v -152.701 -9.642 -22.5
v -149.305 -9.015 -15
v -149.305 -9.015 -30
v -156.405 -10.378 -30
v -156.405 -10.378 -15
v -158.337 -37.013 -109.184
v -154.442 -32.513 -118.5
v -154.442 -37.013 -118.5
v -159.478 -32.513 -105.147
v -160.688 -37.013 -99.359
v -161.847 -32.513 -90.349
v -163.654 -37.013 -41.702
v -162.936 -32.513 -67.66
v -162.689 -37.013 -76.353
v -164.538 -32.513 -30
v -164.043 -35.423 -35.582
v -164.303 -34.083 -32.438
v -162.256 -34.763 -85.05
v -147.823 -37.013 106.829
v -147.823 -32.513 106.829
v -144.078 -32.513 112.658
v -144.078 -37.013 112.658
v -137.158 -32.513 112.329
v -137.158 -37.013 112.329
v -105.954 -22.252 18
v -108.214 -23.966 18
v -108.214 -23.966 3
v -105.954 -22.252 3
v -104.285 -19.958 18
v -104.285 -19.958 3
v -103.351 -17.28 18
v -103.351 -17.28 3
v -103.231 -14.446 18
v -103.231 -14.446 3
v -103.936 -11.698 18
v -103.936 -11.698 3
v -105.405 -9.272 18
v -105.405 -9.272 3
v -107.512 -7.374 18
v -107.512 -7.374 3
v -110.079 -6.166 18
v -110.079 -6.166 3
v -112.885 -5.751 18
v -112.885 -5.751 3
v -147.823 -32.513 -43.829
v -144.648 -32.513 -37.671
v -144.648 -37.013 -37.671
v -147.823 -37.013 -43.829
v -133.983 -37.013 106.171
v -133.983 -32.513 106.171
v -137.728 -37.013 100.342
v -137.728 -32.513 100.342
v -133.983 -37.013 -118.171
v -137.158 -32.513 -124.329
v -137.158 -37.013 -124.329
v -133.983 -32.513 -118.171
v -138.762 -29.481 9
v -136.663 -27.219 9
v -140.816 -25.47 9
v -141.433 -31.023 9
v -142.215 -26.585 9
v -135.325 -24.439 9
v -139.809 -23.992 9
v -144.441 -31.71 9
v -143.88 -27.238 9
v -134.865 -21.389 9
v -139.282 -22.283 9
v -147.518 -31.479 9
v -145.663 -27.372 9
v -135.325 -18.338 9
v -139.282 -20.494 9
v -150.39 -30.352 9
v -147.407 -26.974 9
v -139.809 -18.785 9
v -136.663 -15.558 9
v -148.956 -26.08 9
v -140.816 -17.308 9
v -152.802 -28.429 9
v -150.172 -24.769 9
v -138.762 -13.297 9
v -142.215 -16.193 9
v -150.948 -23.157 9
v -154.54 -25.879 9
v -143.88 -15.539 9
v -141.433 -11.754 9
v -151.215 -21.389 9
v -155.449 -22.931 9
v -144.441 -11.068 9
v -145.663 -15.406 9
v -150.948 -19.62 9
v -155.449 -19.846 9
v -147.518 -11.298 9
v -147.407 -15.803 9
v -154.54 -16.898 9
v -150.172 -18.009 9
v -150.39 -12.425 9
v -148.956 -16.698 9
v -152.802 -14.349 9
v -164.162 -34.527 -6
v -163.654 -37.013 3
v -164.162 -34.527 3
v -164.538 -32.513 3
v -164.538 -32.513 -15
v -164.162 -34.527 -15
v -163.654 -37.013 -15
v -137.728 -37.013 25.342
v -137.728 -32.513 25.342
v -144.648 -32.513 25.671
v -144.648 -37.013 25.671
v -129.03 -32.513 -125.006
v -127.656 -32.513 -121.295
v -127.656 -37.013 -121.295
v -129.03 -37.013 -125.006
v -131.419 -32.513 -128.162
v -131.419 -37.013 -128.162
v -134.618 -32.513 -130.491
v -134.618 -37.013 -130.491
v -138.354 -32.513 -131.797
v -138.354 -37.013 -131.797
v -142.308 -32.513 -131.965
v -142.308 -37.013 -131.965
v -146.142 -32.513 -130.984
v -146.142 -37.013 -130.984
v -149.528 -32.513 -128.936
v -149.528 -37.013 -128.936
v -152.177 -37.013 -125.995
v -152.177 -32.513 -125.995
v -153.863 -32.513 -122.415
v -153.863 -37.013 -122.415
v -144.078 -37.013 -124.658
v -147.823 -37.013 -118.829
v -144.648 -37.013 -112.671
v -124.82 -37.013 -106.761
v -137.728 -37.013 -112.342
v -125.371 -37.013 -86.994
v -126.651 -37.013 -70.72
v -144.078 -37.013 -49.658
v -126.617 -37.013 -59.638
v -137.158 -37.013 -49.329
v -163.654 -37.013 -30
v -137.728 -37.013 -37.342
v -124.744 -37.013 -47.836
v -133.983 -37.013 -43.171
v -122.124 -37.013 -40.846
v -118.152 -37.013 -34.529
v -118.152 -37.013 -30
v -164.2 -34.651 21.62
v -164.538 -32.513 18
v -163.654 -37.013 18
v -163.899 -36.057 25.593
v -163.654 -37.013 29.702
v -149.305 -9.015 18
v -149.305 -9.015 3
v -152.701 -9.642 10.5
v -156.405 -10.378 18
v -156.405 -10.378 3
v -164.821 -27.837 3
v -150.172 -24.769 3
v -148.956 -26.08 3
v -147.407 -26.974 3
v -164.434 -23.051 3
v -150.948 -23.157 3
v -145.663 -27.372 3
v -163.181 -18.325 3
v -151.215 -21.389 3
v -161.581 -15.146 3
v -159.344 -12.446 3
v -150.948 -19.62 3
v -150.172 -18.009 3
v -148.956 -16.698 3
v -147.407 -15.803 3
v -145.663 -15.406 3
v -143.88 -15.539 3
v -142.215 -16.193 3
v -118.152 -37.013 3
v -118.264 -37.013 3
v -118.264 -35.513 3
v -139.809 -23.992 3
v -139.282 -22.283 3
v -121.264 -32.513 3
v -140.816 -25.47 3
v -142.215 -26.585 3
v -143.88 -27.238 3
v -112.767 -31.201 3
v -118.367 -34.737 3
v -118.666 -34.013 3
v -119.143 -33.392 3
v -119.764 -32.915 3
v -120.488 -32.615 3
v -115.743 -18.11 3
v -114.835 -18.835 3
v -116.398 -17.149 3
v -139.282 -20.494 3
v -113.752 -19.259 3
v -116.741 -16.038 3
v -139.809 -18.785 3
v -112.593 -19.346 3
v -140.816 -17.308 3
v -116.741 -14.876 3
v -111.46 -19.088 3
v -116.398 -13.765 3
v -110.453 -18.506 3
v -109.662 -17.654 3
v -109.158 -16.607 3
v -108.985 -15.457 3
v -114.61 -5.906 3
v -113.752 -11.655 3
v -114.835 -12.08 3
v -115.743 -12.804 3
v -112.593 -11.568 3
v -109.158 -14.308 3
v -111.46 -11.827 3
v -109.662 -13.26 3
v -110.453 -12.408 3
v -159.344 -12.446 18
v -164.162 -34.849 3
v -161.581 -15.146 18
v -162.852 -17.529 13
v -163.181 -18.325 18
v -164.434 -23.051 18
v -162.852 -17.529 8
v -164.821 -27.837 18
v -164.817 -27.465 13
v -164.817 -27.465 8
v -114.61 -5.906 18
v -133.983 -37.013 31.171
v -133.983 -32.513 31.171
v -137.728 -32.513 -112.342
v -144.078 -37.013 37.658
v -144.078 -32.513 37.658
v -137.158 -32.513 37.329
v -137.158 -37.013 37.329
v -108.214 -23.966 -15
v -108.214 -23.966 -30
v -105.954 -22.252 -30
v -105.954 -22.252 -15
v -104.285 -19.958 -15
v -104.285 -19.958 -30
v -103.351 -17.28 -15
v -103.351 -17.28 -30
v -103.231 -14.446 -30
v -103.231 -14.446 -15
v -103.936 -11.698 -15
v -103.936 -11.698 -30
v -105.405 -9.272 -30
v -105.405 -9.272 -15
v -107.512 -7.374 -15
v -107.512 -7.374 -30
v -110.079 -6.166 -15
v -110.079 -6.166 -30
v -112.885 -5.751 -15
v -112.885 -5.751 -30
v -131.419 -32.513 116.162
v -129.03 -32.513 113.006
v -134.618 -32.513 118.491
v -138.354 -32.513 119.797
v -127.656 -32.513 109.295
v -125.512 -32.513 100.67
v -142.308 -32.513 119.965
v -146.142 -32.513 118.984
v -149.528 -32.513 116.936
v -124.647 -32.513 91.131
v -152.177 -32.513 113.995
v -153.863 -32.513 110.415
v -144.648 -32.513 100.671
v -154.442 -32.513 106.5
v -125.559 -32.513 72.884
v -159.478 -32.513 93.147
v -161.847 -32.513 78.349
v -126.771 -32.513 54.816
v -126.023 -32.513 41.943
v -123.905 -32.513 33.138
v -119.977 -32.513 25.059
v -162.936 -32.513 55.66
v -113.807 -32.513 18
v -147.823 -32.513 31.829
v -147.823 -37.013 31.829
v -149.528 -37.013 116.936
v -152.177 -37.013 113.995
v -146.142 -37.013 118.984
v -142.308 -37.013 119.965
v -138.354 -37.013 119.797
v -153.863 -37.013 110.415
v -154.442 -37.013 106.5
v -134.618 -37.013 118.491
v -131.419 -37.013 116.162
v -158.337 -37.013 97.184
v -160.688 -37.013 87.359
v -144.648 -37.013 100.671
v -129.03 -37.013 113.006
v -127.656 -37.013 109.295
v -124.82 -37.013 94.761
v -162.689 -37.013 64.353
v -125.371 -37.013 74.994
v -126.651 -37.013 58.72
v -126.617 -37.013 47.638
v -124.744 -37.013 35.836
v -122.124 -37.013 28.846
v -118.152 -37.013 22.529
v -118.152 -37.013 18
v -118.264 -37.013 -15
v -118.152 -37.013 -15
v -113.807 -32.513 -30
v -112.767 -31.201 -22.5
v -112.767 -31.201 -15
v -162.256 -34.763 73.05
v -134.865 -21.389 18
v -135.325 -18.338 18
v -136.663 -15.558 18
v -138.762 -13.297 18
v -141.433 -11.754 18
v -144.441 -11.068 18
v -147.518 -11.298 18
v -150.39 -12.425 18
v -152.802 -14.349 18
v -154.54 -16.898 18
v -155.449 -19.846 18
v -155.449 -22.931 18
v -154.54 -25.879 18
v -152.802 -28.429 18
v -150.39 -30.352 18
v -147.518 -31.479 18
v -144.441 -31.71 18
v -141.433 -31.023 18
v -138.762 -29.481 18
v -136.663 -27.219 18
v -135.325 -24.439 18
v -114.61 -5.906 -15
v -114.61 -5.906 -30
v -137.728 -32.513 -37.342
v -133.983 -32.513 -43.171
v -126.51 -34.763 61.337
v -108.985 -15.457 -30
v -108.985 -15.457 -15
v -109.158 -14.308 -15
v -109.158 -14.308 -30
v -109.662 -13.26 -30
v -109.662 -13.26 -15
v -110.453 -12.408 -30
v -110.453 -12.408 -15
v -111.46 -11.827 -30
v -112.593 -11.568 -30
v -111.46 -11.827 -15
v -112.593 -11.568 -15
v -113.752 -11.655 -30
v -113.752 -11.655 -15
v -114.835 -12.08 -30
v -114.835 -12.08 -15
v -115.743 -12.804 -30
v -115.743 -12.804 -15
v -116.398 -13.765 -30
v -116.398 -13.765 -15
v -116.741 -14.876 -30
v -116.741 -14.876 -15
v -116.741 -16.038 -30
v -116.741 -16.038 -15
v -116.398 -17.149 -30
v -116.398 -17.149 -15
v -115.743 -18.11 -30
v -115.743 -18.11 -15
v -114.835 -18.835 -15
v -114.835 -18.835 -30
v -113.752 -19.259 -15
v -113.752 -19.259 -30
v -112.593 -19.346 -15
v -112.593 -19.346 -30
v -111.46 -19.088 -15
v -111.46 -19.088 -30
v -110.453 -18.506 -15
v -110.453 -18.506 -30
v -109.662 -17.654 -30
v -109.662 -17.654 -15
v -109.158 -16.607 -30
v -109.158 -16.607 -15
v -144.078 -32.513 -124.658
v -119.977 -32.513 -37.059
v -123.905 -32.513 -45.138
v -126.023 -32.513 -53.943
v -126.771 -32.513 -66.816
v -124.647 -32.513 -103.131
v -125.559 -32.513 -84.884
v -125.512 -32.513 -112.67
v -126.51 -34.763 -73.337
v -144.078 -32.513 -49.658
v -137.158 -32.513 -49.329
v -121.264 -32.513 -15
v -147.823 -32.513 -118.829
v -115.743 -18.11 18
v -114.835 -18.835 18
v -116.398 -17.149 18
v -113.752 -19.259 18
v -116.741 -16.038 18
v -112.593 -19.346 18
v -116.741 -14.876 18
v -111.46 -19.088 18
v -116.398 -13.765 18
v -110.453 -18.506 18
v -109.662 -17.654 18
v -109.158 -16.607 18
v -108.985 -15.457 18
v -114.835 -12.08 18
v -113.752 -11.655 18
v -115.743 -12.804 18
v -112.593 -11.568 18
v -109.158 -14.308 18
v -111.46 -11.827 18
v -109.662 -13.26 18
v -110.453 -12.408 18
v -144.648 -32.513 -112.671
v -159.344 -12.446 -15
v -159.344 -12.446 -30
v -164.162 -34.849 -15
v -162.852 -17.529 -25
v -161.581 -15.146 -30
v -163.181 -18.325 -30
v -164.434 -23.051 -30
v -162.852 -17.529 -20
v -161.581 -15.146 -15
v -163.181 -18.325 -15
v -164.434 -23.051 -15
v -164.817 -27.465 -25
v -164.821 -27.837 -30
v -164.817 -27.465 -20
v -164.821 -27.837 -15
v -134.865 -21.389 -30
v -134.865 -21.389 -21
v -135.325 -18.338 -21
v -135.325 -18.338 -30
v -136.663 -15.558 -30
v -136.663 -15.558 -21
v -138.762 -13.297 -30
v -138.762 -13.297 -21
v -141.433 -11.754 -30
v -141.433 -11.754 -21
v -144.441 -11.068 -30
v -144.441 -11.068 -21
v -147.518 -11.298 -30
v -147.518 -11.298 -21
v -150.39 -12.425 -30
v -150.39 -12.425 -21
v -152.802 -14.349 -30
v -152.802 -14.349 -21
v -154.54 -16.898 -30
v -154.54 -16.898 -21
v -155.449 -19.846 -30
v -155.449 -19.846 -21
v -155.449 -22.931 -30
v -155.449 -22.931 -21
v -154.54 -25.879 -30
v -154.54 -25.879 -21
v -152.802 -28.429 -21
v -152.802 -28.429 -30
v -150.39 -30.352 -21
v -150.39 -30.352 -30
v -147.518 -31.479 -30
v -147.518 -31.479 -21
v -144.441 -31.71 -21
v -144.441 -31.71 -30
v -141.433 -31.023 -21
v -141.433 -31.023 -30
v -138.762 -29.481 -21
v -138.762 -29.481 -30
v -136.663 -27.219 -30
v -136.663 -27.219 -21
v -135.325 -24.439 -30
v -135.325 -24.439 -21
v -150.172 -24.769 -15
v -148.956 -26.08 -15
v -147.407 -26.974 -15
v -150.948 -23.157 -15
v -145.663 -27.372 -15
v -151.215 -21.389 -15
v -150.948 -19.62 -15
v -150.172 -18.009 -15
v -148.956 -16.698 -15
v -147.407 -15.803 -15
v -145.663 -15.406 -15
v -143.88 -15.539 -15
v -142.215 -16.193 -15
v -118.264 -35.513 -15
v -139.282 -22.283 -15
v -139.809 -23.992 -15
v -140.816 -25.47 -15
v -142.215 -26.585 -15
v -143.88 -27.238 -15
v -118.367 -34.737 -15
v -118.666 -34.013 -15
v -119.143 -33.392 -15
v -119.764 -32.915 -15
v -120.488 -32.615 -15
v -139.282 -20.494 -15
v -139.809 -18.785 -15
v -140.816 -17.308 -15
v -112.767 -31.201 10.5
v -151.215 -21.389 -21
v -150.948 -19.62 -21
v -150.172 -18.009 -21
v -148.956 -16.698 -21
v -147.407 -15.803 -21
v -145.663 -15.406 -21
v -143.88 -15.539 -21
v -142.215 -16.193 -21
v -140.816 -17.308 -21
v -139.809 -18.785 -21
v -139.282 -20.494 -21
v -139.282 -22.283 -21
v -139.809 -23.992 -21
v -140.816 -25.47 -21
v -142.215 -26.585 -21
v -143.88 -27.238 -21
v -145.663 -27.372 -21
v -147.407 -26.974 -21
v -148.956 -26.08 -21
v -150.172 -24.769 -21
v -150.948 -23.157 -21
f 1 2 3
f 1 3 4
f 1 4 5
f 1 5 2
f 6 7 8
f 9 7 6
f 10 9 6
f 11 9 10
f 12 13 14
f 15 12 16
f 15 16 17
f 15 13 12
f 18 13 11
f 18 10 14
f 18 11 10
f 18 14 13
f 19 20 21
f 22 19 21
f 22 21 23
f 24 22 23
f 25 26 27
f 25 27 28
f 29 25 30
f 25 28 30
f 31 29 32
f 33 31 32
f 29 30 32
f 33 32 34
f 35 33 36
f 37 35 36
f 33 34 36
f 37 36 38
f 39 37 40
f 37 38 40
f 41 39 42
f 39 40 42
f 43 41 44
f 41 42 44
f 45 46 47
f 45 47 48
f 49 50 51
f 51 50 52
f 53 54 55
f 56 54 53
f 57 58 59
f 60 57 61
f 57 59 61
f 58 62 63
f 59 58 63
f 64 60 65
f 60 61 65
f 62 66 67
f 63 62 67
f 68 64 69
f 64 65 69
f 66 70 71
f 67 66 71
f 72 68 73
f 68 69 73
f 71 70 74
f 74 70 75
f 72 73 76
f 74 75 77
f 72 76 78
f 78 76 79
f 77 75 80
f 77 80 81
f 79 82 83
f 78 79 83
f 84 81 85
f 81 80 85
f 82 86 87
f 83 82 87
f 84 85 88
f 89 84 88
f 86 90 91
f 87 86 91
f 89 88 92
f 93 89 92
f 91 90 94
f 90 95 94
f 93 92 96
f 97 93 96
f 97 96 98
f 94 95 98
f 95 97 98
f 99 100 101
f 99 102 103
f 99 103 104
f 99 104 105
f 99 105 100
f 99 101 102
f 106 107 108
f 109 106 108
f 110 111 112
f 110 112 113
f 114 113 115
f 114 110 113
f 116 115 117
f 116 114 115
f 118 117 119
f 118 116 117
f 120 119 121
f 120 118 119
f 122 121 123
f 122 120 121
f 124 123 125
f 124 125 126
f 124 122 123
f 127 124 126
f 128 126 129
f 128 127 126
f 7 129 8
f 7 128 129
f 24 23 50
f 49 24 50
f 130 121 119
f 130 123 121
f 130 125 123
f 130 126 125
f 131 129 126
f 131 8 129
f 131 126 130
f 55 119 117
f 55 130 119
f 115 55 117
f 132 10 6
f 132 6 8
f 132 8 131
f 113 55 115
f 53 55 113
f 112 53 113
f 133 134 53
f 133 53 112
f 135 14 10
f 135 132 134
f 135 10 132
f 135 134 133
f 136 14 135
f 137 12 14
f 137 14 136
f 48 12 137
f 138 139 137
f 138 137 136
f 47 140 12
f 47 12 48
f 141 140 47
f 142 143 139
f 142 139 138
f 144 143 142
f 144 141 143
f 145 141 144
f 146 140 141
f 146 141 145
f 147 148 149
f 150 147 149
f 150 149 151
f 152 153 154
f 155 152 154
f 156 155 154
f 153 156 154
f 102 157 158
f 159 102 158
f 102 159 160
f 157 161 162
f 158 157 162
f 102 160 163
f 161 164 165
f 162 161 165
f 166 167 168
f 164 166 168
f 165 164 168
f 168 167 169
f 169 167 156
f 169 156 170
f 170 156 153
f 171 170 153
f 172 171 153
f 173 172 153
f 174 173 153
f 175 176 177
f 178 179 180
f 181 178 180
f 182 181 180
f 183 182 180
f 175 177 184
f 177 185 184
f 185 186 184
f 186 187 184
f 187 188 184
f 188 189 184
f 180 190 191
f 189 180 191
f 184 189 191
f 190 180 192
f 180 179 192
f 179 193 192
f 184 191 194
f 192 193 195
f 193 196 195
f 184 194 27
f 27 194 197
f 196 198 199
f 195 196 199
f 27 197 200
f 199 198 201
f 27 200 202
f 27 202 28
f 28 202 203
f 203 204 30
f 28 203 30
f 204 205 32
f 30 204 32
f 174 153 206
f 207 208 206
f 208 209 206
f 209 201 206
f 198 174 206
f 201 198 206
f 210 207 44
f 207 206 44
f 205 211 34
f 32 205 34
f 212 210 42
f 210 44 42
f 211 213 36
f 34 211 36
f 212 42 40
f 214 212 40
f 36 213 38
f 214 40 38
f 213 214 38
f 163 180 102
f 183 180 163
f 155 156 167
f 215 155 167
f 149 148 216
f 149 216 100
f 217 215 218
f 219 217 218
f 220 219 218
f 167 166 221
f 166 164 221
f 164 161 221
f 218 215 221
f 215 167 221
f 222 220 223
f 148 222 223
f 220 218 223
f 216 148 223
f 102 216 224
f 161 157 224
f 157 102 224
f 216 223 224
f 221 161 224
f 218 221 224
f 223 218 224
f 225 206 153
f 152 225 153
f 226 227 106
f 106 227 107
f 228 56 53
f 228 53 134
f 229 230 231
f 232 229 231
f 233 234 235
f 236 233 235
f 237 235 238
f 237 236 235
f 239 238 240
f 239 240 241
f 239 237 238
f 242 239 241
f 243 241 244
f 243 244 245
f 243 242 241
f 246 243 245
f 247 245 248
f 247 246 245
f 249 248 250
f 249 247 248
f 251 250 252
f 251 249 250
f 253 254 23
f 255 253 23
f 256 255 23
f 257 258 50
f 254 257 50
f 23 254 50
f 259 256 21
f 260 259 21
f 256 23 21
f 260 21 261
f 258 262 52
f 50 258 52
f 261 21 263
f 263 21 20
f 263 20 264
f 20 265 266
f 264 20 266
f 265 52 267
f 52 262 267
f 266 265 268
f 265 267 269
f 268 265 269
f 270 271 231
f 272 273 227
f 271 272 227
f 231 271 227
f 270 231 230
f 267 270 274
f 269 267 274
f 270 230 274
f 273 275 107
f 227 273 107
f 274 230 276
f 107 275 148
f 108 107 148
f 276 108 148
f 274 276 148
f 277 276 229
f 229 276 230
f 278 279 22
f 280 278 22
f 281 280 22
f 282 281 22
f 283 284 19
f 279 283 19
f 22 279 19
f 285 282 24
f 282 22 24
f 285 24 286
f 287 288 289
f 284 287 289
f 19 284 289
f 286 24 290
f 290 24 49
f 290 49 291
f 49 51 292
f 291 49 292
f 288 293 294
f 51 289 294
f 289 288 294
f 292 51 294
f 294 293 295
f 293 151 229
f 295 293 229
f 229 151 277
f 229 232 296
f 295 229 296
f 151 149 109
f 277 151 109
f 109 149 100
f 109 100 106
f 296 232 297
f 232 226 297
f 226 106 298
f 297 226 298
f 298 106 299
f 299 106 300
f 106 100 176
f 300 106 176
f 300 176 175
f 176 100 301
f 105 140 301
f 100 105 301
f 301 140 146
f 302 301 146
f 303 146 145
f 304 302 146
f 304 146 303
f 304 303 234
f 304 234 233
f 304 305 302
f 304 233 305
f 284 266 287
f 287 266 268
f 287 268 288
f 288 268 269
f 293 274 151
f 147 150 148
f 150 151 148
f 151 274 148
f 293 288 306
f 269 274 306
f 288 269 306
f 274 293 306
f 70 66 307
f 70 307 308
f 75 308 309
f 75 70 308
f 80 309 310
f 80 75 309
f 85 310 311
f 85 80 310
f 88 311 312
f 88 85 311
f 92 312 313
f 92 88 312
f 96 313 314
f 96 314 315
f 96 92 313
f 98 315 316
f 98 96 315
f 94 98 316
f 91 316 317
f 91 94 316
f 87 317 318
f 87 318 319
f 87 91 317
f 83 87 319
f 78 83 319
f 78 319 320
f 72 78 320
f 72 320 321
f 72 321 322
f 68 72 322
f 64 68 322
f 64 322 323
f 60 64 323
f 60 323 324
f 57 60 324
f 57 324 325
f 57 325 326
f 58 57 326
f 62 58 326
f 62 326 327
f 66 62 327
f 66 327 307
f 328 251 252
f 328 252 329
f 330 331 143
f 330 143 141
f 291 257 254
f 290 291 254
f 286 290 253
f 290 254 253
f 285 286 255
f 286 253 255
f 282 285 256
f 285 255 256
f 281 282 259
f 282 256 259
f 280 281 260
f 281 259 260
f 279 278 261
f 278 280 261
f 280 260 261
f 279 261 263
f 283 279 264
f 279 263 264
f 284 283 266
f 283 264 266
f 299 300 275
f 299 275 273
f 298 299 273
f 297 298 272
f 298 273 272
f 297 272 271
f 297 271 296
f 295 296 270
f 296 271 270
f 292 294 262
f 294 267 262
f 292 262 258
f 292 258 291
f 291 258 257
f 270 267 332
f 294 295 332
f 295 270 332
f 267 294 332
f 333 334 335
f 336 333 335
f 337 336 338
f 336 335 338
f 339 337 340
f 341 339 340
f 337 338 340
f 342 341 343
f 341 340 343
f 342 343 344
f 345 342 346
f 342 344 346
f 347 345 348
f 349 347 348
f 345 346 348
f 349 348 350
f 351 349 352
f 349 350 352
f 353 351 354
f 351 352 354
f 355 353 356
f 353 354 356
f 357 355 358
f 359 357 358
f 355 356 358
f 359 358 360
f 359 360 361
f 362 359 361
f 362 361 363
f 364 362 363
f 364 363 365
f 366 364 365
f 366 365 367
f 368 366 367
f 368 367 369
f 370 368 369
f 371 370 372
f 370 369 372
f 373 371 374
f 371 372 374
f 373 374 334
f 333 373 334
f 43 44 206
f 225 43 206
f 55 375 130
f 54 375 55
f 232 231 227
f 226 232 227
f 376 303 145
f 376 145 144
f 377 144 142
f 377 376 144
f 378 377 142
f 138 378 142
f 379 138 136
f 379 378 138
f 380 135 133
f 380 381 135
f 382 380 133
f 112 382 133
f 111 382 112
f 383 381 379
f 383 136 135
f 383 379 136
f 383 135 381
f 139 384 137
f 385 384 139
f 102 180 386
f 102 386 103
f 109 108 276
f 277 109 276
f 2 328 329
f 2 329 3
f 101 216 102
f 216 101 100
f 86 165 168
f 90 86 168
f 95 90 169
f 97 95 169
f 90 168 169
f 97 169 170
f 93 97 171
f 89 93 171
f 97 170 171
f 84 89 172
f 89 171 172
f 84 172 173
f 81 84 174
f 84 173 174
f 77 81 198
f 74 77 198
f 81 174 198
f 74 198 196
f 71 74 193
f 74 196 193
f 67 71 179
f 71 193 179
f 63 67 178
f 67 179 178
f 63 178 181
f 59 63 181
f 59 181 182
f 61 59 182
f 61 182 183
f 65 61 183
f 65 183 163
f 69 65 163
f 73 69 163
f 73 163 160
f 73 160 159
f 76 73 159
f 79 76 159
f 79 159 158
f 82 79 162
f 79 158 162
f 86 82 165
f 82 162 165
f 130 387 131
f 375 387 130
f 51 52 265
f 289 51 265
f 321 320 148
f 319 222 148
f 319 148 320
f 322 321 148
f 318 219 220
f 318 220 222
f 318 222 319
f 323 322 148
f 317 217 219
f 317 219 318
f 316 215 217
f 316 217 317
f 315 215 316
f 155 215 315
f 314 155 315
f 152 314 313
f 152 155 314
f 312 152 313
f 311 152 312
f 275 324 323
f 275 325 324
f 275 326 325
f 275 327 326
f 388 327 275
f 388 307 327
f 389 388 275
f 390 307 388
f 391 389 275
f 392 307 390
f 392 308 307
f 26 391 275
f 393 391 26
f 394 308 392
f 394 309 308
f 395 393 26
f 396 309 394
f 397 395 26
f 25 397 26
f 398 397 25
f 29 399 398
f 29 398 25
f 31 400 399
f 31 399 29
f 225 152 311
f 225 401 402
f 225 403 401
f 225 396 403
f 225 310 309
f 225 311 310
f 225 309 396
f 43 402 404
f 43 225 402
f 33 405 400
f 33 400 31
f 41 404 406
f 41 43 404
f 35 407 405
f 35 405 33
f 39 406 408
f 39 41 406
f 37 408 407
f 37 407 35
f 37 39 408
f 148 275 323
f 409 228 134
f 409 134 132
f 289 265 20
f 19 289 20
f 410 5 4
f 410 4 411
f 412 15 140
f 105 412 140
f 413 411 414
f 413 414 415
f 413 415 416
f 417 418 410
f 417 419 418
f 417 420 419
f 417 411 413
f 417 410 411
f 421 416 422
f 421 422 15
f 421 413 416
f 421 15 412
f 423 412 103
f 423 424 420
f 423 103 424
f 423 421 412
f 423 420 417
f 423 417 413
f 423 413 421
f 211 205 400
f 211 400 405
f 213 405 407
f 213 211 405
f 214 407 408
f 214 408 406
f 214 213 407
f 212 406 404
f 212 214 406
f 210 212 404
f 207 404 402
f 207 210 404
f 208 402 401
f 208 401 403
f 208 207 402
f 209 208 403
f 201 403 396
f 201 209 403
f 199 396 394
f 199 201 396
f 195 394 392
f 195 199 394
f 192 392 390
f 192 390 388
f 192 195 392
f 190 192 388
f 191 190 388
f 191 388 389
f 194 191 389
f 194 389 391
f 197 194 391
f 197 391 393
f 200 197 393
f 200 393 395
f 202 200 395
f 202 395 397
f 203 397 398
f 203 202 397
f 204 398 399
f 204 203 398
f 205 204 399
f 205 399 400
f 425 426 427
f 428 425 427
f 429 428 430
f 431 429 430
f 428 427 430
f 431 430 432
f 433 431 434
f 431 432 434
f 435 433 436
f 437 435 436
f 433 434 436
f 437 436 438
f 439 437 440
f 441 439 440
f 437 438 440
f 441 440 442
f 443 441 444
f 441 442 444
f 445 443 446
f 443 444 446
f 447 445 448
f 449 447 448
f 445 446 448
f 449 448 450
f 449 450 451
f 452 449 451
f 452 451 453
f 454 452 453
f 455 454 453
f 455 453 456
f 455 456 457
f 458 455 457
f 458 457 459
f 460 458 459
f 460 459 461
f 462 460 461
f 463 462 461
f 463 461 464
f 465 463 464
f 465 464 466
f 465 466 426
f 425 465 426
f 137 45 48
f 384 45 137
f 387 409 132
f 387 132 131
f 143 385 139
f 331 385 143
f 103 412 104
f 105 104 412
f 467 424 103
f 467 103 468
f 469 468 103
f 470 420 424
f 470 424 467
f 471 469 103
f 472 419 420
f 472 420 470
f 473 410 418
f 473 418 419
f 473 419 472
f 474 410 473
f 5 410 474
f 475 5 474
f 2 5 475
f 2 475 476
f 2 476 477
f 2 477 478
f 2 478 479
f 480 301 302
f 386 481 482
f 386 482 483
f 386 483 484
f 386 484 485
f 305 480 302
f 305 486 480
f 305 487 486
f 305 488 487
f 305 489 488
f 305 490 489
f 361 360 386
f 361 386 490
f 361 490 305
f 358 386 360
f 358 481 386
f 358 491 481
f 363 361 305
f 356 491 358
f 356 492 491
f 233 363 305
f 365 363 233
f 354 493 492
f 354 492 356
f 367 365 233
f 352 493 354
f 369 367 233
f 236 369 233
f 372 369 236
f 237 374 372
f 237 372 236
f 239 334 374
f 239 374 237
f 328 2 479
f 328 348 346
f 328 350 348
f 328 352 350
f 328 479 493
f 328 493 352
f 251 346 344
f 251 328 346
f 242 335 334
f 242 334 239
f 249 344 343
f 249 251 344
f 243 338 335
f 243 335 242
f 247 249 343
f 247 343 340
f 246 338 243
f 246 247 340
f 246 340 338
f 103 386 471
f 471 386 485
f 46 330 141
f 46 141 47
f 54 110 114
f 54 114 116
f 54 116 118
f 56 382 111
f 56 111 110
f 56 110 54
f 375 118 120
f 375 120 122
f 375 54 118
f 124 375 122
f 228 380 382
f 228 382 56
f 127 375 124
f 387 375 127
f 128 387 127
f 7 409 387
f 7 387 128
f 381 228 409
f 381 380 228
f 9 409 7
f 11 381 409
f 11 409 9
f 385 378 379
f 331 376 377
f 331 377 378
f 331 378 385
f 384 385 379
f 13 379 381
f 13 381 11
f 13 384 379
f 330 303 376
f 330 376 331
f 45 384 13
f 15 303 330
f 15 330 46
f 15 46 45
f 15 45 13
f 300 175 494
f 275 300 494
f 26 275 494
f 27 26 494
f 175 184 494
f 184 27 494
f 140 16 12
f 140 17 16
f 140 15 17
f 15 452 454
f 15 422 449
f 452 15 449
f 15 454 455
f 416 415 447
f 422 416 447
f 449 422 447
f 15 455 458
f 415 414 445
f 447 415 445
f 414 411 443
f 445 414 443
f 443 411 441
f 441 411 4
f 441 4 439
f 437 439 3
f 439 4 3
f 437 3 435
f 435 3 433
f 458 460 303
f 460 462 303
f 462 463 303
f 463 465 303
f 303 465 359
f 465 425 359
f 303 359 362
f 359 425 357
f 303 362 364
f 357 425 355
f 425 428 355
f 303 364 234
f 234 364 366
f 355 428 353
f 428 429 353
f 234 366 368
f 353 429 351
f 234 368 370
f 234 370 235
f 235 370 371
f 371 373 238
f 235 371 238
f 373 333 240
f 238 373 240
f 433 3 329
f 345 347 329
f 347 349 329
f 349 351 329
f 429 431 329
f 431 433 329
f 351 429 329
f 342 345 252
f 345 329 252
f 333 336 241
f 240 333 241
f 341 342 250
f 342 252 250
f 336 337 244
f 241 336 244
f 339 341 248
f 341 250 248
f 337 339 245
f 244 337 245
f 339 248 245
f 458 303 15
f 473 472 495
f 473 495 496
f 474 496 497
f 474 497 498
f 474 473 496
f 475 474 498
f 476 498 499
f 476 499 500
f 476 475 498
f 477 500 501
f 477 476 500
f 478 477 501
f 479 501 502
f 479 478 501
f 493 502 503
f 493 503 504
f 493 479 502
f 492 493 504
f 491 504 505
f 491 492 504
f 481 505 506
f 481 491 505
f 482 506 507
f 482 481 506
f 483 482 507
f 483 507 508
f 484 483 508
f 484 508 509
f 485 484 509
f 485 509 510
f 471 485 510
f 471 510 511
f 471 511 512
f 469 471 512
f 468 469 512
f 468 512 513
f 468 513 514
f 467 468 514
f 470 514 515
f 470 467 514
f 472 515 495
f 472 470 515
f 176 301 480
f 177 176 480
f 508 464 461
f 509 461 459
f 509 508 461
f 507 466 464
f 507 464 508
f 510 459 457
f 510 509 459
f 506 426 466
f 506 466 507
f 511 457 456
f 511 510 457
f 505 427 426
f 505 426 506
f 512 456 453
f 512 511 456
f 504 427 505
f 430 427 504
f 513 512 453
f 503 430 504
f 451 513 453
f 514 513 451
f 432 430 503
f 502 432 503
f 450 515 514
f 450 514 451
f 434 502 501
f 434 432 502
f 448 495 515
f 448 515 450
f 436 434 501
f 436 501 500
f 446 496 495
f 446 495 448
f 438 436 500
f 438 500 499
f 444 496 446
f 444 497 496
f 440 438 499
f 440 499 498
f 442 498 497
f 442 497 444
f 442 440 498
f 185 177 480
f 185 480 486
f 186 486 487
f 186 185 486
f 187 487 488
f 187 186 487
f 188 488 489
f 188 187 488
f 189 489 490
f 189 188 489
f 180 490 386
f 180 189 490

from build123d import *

# Parameters (mm, degrees)
SKETCH1_R           = 6.9
SKETCH1_R_2         = 2.6
BOSS_EXTRUDE1_DEPTH = 10
BOSS_EXTRUDE2_DEPTH = 12
SKETCH3_R           = 7
SKETCH3_R_2         = 4
BOSS_EXTRUDE3_DEPTH = 4
BOSS_EXTRUDE4_DEPTH = 84
BOSS_EXTRUDE5_DEPTH = 84
CUT_EXTRUDE1_DEPTH  = 190.323263107
SCALE1_SCALE        = 1.5


with BuildPart() as part:
    # Sketch1 → Boss-Extrude1 (new body)
    with BuildSketch(Plane.XY):
        with BuildLine():
            Line((-155.070766667, -34.03543395), (-139.182010536, -34.03543395))
            Line((-139.182010536, -34.03543395), (-124.735717634, -34.03543395))
            add(Edge.make_bspline(
                [(-124.735717634, -34.03543395), (-120.868070652, -30.634901056), (-118.110731489, -25.337058748)],
                knots=[0.604913823, 0.604913823, 0.604913823, 1, 1, 1], degree=2))
            ThreePointArc((-118.110731489, -25.337058748), (-114.956411592, -18.057608365), (-121.224300514, -13.194101363))
            Line((-121.224300514, -13.194101363), (-122.374915538, -13.297224598))
            Line((-122.374915538, -13.297224598), (-145.504342678, -15.370186717))
            add(Edge.make_bspline(
                [(-145.504342678, -15.370186717), (-147.665446471, -15.751951197), (-150.237941893, -16.278752791)],
                knots=[0, 0, 0, 0.143499102, 0.143499102, 0.143499102], degree=2))
            add(Edge.make_bspline(
                [(-150.237941893, -16.278752791), (-156.331446907, -19.412430802), (-156.587305002, -28.504886835), (-155.070766667, -34.03543395)],
                knots=[0, 0, 0, 0, 1, 1, 1, 1], degree=3))
        make_face()
        with Locations((-142.777717077, -23.619181221)):
            Circle(SKETCH1_R, mode=Mode.SUBTRACT)
        with Locations((-121.224300514, -19.664754316)):
            Circle(SKETCH1_R_2, mode=Mode.SUBTRACT)
    boss_extrude1 = extrude(amount=BOSS_EXTRUDE1_DEPTH)

    # Sketch2 → Boss-Extrude2 (add)
    with BuildSketch(Plane(origin=(0, 0, 0), x_dir=(-1, 0, 0), z_dir=(0, 0, -1))):
        with BuildLine():
            Line((124.810828249, -34.03543395), (124.810828249, -33.03543395))
            ThreePointArc((124.810828249, -33.03543395), (125.396614687, -31.621220388), (126.810828249, -31.03543395))
            Line((126.810828249, -31.03543395), (155.660238601, -31.03543395))
            add(Edge.make_bspline(
                [(155.660238601, -31.03543395), (155.453340821, -32.220849379), (155.070766667, -34.03543395)],
                knots=[0.469279702, 0.469279702, 0.469279702, 1.113861257, 1.113861257, 1.113861257], degree=2))
            Line((155.070766667, -34.03543395), (124.810828249, -34.03543395))
        make_face()
    extrude(amount=BOSS_EXTRUDE2_DEPTH)

    # Mirror1: Boss-Extrude1 across plane
    add(boss_extrude1.mirror(Plane(origin=(0, 0, -6), x_dir=(1, 0, 0), z_dir=(0, 0, -1))))

    # Sketch3 → Boss-Extrude3 (add)
    with BuildSketch(Plane(origin=(0, 0, 0), x_dir=(-1, 0, 0), z_dir=(0, 0, -1))):
        with Locations((142.777717077, -23.619181221)):
            Circle(SKETCH3_R)
        with Locations((142.777717077, -23.619181221)):
            Circle(SKETCH3_R_2, mode=Mode.SUBTRACT)
    boss_extrude3 = extrude(amount=-BOSS_EXTRUDE3_DEPTH)

    # Mirror2: Boss-Extrude3 across plane
    add(boss_extrude3.mirror(Plane(origin=(0, 0, -6), x_dir=(1, 0, 0), z_dir=(0, 0, -1))))

    # Sketch4 → Boss-Extrude4 (add)
    with BuildSketch(Plane.XY.offset(10)):
        with BuildLine():
            add(Edge.make_bspline(
                [(-155.660238601, -31.03543395), (-155.52477055, -32.104378324), (-155.322110933, -33.11882586), (-155.070766667, -34.03543395)],
                knots=[0.834264482, 0.834264482, 0.834264482, 0.834264482, 1, 1, 1, 1], degree=3))
            Line((-155.070766667, -34.03543395), (-124.735717634, -34.03543395))
            add(Edge.make_bspline(
                [(-124.735717634, -34.03543395), (-123.199822379, -32.685036057), (-121.8390218, -31.03543395)],
                knots=[0, 0, 0, 1, 1, 1], degree=2))
            Line((-121.8390218, -31.03543395), (-155.660238601, -31.03543395))
        make_face()
    extrude(amount=BOSS_EXTRUDE4_DEPTH)

    # Sketch5 → Boss-Extrude5 (add)
    with BuildSketch(Plane(origin=(0, 0, -22), x_dir=(-1, 0, 0), z_dir=(0, 0, -1))):
        with BuildLine():
            Line((155.070766667, -34.03543395), (124.735717633, -34.035433949))
            add(Edge.make_bspline(
                [(124.735717633, -34.035433949), (123.199822378, -32.685036056), (121.8390218, -31.03543395)],
                knots=[0, 0, 0, 1, 1, 1], degree=2))
            Line((121.8390218, -31.03543395), (155.660238601, -31.03543395))
            add(Edge.make_bspline(
                [(155.660238601, -31.03543395), (155.52477055, -32.104378324), (155.322110933, -33.11882586), (155.070766667, -34.03543395)],
                knots=[0.834264482, 0.834264482, 0.834264482, 0.834264482, 1, 1, 1, 1], degree=3))
        make_face()
    extrude(amount=BOSS_EXTRUDE5_DEPTH)

    # Sketch6 → Cut-Extrude1 (cut, through all)
    with BuildSketch(Plane(origin=(0, -31.03543395, 0), x_dir=(1, 0, 0), z_dir=(0, 1, 0))):
        Polygon((-137.786415389, 76.894835229), (-142.400005748, 77.114191864), (-144.516832509, 81.219356636), (-142.02006891, 85.105164771), (-137.406478551, 84.885808136), (-135.289651791, 80.780643364), align=None)
        Polygon((-135.289651791, 30.780643364), (-137.786415389, 26.894835229), (-142.400005748, 27.114191864), (-144.516832509, 31.219356636), (-142.02006891, 35.105164771), (-137.406478551, 34.885808136), align=None)
        with BuildLine():
            Line((-155.6602386, 22), (-173.465321409, 22))
            Line((-173.465321409, 22), (-173.465321409, 117.834139367))
            Line((-173.465321409, 117.834139367), (-100.430925903, 117.834139367))
            Line((-100.430925903, 117.834139367), (-121.8390218, 22))
            add(Edge.make_bspline(
                [(-121.8390218, 22), (-130.237957541, 29.288236007), (-131.708688401, 51.819501052), (-127.475857655, 72.230953717), (-131.071963897, 82.863468574)],
                knots=[0, 0, 0, 0, 0.490729359, 1, 1, 1, 1], degree=3))
            ThreePointArc((-131.071963897, 82.863468574), (-140.840035974, 89.976993263), (-148.928982602, 81))
            add(Edge.make_bspline(
                [(-148.928982602, 81), (-152.625386512, 74.081760345), (-155.262352814, 54.105117148), (-154.402874629, 34.24459948), (-155.6602386, 22)],
                knots=[0, 0, 0, 0, 0.385424941, 1, 1, 1, 1], degree=3))
        make_face()
        with BuildLine():
            Line((-100.430925903, -105.834139367), (-121.8390218, -10))
            add(Edge.make_bspline(
                [(-121.8390218, -10), (-130.237957541, -17.288236007), (-131.708688401, -39.819501052), (-127.475857655, -60.230953717), (-131.071963897, -70.863468574)],
                knots=[0, 0, 0, 0, 0.490729359, 1, 1, 1, 1], degree=3))
            ThreePointArc((-131.071963897, -70.863468574), (-140.840035974, -77.976993263), (-148.928982602, -69))
            add(Edge.make_bspline(
                [(-148.928982602, -69), (-152.625386512, -62.081760345), (-155.262352814, -42.105117148), (-154.402874629, -22.24459948), (-155.6602386, -10)],
                knots=[0, 0, 0, 0, 0.385424941, 1, 1, 1, 1], degree=3))
            Line((-155.6602386, -10), (-173.465321409, -10))
            Line((-173.465321409, -10), (-173.465321409, -105.834139367))
            Line((-173.465321409, -105.834139367), (-100.430925903, -105.834139367))
        make_face()
        Polygon((-142.02006891, -23.105164771), (-137.406478551, -22.885808136), (-135.289651791, -18.780643364), (-137.786415389, -14.894835229), (-142.400005748, -15.114191864), (-144.516832509, -19.219356636), align=None)
        Polygon((-135.289651791, -68.780643364), (-137.786415389, -64.894835229), (-142.400005748, -65.114191864), (-144.516832509, -69.219356636), (-142.02006891, -73.105164771), (-137.406478551, -72.885808136), align=None)
    extrude(amount=-CUT_EXTRUDE1_DEPTH, mode=Mode.SUBTRACT)


with BuildPart() as part_1:
    # Scale1: scaled about (-137.903774464, -28.080076636, -5.999999982)
    add(part.part.scale(SCALE1_SCALE).moved(Location((68.951887232, 14.040038318, 2.999999991))))


solid = part_1.part
